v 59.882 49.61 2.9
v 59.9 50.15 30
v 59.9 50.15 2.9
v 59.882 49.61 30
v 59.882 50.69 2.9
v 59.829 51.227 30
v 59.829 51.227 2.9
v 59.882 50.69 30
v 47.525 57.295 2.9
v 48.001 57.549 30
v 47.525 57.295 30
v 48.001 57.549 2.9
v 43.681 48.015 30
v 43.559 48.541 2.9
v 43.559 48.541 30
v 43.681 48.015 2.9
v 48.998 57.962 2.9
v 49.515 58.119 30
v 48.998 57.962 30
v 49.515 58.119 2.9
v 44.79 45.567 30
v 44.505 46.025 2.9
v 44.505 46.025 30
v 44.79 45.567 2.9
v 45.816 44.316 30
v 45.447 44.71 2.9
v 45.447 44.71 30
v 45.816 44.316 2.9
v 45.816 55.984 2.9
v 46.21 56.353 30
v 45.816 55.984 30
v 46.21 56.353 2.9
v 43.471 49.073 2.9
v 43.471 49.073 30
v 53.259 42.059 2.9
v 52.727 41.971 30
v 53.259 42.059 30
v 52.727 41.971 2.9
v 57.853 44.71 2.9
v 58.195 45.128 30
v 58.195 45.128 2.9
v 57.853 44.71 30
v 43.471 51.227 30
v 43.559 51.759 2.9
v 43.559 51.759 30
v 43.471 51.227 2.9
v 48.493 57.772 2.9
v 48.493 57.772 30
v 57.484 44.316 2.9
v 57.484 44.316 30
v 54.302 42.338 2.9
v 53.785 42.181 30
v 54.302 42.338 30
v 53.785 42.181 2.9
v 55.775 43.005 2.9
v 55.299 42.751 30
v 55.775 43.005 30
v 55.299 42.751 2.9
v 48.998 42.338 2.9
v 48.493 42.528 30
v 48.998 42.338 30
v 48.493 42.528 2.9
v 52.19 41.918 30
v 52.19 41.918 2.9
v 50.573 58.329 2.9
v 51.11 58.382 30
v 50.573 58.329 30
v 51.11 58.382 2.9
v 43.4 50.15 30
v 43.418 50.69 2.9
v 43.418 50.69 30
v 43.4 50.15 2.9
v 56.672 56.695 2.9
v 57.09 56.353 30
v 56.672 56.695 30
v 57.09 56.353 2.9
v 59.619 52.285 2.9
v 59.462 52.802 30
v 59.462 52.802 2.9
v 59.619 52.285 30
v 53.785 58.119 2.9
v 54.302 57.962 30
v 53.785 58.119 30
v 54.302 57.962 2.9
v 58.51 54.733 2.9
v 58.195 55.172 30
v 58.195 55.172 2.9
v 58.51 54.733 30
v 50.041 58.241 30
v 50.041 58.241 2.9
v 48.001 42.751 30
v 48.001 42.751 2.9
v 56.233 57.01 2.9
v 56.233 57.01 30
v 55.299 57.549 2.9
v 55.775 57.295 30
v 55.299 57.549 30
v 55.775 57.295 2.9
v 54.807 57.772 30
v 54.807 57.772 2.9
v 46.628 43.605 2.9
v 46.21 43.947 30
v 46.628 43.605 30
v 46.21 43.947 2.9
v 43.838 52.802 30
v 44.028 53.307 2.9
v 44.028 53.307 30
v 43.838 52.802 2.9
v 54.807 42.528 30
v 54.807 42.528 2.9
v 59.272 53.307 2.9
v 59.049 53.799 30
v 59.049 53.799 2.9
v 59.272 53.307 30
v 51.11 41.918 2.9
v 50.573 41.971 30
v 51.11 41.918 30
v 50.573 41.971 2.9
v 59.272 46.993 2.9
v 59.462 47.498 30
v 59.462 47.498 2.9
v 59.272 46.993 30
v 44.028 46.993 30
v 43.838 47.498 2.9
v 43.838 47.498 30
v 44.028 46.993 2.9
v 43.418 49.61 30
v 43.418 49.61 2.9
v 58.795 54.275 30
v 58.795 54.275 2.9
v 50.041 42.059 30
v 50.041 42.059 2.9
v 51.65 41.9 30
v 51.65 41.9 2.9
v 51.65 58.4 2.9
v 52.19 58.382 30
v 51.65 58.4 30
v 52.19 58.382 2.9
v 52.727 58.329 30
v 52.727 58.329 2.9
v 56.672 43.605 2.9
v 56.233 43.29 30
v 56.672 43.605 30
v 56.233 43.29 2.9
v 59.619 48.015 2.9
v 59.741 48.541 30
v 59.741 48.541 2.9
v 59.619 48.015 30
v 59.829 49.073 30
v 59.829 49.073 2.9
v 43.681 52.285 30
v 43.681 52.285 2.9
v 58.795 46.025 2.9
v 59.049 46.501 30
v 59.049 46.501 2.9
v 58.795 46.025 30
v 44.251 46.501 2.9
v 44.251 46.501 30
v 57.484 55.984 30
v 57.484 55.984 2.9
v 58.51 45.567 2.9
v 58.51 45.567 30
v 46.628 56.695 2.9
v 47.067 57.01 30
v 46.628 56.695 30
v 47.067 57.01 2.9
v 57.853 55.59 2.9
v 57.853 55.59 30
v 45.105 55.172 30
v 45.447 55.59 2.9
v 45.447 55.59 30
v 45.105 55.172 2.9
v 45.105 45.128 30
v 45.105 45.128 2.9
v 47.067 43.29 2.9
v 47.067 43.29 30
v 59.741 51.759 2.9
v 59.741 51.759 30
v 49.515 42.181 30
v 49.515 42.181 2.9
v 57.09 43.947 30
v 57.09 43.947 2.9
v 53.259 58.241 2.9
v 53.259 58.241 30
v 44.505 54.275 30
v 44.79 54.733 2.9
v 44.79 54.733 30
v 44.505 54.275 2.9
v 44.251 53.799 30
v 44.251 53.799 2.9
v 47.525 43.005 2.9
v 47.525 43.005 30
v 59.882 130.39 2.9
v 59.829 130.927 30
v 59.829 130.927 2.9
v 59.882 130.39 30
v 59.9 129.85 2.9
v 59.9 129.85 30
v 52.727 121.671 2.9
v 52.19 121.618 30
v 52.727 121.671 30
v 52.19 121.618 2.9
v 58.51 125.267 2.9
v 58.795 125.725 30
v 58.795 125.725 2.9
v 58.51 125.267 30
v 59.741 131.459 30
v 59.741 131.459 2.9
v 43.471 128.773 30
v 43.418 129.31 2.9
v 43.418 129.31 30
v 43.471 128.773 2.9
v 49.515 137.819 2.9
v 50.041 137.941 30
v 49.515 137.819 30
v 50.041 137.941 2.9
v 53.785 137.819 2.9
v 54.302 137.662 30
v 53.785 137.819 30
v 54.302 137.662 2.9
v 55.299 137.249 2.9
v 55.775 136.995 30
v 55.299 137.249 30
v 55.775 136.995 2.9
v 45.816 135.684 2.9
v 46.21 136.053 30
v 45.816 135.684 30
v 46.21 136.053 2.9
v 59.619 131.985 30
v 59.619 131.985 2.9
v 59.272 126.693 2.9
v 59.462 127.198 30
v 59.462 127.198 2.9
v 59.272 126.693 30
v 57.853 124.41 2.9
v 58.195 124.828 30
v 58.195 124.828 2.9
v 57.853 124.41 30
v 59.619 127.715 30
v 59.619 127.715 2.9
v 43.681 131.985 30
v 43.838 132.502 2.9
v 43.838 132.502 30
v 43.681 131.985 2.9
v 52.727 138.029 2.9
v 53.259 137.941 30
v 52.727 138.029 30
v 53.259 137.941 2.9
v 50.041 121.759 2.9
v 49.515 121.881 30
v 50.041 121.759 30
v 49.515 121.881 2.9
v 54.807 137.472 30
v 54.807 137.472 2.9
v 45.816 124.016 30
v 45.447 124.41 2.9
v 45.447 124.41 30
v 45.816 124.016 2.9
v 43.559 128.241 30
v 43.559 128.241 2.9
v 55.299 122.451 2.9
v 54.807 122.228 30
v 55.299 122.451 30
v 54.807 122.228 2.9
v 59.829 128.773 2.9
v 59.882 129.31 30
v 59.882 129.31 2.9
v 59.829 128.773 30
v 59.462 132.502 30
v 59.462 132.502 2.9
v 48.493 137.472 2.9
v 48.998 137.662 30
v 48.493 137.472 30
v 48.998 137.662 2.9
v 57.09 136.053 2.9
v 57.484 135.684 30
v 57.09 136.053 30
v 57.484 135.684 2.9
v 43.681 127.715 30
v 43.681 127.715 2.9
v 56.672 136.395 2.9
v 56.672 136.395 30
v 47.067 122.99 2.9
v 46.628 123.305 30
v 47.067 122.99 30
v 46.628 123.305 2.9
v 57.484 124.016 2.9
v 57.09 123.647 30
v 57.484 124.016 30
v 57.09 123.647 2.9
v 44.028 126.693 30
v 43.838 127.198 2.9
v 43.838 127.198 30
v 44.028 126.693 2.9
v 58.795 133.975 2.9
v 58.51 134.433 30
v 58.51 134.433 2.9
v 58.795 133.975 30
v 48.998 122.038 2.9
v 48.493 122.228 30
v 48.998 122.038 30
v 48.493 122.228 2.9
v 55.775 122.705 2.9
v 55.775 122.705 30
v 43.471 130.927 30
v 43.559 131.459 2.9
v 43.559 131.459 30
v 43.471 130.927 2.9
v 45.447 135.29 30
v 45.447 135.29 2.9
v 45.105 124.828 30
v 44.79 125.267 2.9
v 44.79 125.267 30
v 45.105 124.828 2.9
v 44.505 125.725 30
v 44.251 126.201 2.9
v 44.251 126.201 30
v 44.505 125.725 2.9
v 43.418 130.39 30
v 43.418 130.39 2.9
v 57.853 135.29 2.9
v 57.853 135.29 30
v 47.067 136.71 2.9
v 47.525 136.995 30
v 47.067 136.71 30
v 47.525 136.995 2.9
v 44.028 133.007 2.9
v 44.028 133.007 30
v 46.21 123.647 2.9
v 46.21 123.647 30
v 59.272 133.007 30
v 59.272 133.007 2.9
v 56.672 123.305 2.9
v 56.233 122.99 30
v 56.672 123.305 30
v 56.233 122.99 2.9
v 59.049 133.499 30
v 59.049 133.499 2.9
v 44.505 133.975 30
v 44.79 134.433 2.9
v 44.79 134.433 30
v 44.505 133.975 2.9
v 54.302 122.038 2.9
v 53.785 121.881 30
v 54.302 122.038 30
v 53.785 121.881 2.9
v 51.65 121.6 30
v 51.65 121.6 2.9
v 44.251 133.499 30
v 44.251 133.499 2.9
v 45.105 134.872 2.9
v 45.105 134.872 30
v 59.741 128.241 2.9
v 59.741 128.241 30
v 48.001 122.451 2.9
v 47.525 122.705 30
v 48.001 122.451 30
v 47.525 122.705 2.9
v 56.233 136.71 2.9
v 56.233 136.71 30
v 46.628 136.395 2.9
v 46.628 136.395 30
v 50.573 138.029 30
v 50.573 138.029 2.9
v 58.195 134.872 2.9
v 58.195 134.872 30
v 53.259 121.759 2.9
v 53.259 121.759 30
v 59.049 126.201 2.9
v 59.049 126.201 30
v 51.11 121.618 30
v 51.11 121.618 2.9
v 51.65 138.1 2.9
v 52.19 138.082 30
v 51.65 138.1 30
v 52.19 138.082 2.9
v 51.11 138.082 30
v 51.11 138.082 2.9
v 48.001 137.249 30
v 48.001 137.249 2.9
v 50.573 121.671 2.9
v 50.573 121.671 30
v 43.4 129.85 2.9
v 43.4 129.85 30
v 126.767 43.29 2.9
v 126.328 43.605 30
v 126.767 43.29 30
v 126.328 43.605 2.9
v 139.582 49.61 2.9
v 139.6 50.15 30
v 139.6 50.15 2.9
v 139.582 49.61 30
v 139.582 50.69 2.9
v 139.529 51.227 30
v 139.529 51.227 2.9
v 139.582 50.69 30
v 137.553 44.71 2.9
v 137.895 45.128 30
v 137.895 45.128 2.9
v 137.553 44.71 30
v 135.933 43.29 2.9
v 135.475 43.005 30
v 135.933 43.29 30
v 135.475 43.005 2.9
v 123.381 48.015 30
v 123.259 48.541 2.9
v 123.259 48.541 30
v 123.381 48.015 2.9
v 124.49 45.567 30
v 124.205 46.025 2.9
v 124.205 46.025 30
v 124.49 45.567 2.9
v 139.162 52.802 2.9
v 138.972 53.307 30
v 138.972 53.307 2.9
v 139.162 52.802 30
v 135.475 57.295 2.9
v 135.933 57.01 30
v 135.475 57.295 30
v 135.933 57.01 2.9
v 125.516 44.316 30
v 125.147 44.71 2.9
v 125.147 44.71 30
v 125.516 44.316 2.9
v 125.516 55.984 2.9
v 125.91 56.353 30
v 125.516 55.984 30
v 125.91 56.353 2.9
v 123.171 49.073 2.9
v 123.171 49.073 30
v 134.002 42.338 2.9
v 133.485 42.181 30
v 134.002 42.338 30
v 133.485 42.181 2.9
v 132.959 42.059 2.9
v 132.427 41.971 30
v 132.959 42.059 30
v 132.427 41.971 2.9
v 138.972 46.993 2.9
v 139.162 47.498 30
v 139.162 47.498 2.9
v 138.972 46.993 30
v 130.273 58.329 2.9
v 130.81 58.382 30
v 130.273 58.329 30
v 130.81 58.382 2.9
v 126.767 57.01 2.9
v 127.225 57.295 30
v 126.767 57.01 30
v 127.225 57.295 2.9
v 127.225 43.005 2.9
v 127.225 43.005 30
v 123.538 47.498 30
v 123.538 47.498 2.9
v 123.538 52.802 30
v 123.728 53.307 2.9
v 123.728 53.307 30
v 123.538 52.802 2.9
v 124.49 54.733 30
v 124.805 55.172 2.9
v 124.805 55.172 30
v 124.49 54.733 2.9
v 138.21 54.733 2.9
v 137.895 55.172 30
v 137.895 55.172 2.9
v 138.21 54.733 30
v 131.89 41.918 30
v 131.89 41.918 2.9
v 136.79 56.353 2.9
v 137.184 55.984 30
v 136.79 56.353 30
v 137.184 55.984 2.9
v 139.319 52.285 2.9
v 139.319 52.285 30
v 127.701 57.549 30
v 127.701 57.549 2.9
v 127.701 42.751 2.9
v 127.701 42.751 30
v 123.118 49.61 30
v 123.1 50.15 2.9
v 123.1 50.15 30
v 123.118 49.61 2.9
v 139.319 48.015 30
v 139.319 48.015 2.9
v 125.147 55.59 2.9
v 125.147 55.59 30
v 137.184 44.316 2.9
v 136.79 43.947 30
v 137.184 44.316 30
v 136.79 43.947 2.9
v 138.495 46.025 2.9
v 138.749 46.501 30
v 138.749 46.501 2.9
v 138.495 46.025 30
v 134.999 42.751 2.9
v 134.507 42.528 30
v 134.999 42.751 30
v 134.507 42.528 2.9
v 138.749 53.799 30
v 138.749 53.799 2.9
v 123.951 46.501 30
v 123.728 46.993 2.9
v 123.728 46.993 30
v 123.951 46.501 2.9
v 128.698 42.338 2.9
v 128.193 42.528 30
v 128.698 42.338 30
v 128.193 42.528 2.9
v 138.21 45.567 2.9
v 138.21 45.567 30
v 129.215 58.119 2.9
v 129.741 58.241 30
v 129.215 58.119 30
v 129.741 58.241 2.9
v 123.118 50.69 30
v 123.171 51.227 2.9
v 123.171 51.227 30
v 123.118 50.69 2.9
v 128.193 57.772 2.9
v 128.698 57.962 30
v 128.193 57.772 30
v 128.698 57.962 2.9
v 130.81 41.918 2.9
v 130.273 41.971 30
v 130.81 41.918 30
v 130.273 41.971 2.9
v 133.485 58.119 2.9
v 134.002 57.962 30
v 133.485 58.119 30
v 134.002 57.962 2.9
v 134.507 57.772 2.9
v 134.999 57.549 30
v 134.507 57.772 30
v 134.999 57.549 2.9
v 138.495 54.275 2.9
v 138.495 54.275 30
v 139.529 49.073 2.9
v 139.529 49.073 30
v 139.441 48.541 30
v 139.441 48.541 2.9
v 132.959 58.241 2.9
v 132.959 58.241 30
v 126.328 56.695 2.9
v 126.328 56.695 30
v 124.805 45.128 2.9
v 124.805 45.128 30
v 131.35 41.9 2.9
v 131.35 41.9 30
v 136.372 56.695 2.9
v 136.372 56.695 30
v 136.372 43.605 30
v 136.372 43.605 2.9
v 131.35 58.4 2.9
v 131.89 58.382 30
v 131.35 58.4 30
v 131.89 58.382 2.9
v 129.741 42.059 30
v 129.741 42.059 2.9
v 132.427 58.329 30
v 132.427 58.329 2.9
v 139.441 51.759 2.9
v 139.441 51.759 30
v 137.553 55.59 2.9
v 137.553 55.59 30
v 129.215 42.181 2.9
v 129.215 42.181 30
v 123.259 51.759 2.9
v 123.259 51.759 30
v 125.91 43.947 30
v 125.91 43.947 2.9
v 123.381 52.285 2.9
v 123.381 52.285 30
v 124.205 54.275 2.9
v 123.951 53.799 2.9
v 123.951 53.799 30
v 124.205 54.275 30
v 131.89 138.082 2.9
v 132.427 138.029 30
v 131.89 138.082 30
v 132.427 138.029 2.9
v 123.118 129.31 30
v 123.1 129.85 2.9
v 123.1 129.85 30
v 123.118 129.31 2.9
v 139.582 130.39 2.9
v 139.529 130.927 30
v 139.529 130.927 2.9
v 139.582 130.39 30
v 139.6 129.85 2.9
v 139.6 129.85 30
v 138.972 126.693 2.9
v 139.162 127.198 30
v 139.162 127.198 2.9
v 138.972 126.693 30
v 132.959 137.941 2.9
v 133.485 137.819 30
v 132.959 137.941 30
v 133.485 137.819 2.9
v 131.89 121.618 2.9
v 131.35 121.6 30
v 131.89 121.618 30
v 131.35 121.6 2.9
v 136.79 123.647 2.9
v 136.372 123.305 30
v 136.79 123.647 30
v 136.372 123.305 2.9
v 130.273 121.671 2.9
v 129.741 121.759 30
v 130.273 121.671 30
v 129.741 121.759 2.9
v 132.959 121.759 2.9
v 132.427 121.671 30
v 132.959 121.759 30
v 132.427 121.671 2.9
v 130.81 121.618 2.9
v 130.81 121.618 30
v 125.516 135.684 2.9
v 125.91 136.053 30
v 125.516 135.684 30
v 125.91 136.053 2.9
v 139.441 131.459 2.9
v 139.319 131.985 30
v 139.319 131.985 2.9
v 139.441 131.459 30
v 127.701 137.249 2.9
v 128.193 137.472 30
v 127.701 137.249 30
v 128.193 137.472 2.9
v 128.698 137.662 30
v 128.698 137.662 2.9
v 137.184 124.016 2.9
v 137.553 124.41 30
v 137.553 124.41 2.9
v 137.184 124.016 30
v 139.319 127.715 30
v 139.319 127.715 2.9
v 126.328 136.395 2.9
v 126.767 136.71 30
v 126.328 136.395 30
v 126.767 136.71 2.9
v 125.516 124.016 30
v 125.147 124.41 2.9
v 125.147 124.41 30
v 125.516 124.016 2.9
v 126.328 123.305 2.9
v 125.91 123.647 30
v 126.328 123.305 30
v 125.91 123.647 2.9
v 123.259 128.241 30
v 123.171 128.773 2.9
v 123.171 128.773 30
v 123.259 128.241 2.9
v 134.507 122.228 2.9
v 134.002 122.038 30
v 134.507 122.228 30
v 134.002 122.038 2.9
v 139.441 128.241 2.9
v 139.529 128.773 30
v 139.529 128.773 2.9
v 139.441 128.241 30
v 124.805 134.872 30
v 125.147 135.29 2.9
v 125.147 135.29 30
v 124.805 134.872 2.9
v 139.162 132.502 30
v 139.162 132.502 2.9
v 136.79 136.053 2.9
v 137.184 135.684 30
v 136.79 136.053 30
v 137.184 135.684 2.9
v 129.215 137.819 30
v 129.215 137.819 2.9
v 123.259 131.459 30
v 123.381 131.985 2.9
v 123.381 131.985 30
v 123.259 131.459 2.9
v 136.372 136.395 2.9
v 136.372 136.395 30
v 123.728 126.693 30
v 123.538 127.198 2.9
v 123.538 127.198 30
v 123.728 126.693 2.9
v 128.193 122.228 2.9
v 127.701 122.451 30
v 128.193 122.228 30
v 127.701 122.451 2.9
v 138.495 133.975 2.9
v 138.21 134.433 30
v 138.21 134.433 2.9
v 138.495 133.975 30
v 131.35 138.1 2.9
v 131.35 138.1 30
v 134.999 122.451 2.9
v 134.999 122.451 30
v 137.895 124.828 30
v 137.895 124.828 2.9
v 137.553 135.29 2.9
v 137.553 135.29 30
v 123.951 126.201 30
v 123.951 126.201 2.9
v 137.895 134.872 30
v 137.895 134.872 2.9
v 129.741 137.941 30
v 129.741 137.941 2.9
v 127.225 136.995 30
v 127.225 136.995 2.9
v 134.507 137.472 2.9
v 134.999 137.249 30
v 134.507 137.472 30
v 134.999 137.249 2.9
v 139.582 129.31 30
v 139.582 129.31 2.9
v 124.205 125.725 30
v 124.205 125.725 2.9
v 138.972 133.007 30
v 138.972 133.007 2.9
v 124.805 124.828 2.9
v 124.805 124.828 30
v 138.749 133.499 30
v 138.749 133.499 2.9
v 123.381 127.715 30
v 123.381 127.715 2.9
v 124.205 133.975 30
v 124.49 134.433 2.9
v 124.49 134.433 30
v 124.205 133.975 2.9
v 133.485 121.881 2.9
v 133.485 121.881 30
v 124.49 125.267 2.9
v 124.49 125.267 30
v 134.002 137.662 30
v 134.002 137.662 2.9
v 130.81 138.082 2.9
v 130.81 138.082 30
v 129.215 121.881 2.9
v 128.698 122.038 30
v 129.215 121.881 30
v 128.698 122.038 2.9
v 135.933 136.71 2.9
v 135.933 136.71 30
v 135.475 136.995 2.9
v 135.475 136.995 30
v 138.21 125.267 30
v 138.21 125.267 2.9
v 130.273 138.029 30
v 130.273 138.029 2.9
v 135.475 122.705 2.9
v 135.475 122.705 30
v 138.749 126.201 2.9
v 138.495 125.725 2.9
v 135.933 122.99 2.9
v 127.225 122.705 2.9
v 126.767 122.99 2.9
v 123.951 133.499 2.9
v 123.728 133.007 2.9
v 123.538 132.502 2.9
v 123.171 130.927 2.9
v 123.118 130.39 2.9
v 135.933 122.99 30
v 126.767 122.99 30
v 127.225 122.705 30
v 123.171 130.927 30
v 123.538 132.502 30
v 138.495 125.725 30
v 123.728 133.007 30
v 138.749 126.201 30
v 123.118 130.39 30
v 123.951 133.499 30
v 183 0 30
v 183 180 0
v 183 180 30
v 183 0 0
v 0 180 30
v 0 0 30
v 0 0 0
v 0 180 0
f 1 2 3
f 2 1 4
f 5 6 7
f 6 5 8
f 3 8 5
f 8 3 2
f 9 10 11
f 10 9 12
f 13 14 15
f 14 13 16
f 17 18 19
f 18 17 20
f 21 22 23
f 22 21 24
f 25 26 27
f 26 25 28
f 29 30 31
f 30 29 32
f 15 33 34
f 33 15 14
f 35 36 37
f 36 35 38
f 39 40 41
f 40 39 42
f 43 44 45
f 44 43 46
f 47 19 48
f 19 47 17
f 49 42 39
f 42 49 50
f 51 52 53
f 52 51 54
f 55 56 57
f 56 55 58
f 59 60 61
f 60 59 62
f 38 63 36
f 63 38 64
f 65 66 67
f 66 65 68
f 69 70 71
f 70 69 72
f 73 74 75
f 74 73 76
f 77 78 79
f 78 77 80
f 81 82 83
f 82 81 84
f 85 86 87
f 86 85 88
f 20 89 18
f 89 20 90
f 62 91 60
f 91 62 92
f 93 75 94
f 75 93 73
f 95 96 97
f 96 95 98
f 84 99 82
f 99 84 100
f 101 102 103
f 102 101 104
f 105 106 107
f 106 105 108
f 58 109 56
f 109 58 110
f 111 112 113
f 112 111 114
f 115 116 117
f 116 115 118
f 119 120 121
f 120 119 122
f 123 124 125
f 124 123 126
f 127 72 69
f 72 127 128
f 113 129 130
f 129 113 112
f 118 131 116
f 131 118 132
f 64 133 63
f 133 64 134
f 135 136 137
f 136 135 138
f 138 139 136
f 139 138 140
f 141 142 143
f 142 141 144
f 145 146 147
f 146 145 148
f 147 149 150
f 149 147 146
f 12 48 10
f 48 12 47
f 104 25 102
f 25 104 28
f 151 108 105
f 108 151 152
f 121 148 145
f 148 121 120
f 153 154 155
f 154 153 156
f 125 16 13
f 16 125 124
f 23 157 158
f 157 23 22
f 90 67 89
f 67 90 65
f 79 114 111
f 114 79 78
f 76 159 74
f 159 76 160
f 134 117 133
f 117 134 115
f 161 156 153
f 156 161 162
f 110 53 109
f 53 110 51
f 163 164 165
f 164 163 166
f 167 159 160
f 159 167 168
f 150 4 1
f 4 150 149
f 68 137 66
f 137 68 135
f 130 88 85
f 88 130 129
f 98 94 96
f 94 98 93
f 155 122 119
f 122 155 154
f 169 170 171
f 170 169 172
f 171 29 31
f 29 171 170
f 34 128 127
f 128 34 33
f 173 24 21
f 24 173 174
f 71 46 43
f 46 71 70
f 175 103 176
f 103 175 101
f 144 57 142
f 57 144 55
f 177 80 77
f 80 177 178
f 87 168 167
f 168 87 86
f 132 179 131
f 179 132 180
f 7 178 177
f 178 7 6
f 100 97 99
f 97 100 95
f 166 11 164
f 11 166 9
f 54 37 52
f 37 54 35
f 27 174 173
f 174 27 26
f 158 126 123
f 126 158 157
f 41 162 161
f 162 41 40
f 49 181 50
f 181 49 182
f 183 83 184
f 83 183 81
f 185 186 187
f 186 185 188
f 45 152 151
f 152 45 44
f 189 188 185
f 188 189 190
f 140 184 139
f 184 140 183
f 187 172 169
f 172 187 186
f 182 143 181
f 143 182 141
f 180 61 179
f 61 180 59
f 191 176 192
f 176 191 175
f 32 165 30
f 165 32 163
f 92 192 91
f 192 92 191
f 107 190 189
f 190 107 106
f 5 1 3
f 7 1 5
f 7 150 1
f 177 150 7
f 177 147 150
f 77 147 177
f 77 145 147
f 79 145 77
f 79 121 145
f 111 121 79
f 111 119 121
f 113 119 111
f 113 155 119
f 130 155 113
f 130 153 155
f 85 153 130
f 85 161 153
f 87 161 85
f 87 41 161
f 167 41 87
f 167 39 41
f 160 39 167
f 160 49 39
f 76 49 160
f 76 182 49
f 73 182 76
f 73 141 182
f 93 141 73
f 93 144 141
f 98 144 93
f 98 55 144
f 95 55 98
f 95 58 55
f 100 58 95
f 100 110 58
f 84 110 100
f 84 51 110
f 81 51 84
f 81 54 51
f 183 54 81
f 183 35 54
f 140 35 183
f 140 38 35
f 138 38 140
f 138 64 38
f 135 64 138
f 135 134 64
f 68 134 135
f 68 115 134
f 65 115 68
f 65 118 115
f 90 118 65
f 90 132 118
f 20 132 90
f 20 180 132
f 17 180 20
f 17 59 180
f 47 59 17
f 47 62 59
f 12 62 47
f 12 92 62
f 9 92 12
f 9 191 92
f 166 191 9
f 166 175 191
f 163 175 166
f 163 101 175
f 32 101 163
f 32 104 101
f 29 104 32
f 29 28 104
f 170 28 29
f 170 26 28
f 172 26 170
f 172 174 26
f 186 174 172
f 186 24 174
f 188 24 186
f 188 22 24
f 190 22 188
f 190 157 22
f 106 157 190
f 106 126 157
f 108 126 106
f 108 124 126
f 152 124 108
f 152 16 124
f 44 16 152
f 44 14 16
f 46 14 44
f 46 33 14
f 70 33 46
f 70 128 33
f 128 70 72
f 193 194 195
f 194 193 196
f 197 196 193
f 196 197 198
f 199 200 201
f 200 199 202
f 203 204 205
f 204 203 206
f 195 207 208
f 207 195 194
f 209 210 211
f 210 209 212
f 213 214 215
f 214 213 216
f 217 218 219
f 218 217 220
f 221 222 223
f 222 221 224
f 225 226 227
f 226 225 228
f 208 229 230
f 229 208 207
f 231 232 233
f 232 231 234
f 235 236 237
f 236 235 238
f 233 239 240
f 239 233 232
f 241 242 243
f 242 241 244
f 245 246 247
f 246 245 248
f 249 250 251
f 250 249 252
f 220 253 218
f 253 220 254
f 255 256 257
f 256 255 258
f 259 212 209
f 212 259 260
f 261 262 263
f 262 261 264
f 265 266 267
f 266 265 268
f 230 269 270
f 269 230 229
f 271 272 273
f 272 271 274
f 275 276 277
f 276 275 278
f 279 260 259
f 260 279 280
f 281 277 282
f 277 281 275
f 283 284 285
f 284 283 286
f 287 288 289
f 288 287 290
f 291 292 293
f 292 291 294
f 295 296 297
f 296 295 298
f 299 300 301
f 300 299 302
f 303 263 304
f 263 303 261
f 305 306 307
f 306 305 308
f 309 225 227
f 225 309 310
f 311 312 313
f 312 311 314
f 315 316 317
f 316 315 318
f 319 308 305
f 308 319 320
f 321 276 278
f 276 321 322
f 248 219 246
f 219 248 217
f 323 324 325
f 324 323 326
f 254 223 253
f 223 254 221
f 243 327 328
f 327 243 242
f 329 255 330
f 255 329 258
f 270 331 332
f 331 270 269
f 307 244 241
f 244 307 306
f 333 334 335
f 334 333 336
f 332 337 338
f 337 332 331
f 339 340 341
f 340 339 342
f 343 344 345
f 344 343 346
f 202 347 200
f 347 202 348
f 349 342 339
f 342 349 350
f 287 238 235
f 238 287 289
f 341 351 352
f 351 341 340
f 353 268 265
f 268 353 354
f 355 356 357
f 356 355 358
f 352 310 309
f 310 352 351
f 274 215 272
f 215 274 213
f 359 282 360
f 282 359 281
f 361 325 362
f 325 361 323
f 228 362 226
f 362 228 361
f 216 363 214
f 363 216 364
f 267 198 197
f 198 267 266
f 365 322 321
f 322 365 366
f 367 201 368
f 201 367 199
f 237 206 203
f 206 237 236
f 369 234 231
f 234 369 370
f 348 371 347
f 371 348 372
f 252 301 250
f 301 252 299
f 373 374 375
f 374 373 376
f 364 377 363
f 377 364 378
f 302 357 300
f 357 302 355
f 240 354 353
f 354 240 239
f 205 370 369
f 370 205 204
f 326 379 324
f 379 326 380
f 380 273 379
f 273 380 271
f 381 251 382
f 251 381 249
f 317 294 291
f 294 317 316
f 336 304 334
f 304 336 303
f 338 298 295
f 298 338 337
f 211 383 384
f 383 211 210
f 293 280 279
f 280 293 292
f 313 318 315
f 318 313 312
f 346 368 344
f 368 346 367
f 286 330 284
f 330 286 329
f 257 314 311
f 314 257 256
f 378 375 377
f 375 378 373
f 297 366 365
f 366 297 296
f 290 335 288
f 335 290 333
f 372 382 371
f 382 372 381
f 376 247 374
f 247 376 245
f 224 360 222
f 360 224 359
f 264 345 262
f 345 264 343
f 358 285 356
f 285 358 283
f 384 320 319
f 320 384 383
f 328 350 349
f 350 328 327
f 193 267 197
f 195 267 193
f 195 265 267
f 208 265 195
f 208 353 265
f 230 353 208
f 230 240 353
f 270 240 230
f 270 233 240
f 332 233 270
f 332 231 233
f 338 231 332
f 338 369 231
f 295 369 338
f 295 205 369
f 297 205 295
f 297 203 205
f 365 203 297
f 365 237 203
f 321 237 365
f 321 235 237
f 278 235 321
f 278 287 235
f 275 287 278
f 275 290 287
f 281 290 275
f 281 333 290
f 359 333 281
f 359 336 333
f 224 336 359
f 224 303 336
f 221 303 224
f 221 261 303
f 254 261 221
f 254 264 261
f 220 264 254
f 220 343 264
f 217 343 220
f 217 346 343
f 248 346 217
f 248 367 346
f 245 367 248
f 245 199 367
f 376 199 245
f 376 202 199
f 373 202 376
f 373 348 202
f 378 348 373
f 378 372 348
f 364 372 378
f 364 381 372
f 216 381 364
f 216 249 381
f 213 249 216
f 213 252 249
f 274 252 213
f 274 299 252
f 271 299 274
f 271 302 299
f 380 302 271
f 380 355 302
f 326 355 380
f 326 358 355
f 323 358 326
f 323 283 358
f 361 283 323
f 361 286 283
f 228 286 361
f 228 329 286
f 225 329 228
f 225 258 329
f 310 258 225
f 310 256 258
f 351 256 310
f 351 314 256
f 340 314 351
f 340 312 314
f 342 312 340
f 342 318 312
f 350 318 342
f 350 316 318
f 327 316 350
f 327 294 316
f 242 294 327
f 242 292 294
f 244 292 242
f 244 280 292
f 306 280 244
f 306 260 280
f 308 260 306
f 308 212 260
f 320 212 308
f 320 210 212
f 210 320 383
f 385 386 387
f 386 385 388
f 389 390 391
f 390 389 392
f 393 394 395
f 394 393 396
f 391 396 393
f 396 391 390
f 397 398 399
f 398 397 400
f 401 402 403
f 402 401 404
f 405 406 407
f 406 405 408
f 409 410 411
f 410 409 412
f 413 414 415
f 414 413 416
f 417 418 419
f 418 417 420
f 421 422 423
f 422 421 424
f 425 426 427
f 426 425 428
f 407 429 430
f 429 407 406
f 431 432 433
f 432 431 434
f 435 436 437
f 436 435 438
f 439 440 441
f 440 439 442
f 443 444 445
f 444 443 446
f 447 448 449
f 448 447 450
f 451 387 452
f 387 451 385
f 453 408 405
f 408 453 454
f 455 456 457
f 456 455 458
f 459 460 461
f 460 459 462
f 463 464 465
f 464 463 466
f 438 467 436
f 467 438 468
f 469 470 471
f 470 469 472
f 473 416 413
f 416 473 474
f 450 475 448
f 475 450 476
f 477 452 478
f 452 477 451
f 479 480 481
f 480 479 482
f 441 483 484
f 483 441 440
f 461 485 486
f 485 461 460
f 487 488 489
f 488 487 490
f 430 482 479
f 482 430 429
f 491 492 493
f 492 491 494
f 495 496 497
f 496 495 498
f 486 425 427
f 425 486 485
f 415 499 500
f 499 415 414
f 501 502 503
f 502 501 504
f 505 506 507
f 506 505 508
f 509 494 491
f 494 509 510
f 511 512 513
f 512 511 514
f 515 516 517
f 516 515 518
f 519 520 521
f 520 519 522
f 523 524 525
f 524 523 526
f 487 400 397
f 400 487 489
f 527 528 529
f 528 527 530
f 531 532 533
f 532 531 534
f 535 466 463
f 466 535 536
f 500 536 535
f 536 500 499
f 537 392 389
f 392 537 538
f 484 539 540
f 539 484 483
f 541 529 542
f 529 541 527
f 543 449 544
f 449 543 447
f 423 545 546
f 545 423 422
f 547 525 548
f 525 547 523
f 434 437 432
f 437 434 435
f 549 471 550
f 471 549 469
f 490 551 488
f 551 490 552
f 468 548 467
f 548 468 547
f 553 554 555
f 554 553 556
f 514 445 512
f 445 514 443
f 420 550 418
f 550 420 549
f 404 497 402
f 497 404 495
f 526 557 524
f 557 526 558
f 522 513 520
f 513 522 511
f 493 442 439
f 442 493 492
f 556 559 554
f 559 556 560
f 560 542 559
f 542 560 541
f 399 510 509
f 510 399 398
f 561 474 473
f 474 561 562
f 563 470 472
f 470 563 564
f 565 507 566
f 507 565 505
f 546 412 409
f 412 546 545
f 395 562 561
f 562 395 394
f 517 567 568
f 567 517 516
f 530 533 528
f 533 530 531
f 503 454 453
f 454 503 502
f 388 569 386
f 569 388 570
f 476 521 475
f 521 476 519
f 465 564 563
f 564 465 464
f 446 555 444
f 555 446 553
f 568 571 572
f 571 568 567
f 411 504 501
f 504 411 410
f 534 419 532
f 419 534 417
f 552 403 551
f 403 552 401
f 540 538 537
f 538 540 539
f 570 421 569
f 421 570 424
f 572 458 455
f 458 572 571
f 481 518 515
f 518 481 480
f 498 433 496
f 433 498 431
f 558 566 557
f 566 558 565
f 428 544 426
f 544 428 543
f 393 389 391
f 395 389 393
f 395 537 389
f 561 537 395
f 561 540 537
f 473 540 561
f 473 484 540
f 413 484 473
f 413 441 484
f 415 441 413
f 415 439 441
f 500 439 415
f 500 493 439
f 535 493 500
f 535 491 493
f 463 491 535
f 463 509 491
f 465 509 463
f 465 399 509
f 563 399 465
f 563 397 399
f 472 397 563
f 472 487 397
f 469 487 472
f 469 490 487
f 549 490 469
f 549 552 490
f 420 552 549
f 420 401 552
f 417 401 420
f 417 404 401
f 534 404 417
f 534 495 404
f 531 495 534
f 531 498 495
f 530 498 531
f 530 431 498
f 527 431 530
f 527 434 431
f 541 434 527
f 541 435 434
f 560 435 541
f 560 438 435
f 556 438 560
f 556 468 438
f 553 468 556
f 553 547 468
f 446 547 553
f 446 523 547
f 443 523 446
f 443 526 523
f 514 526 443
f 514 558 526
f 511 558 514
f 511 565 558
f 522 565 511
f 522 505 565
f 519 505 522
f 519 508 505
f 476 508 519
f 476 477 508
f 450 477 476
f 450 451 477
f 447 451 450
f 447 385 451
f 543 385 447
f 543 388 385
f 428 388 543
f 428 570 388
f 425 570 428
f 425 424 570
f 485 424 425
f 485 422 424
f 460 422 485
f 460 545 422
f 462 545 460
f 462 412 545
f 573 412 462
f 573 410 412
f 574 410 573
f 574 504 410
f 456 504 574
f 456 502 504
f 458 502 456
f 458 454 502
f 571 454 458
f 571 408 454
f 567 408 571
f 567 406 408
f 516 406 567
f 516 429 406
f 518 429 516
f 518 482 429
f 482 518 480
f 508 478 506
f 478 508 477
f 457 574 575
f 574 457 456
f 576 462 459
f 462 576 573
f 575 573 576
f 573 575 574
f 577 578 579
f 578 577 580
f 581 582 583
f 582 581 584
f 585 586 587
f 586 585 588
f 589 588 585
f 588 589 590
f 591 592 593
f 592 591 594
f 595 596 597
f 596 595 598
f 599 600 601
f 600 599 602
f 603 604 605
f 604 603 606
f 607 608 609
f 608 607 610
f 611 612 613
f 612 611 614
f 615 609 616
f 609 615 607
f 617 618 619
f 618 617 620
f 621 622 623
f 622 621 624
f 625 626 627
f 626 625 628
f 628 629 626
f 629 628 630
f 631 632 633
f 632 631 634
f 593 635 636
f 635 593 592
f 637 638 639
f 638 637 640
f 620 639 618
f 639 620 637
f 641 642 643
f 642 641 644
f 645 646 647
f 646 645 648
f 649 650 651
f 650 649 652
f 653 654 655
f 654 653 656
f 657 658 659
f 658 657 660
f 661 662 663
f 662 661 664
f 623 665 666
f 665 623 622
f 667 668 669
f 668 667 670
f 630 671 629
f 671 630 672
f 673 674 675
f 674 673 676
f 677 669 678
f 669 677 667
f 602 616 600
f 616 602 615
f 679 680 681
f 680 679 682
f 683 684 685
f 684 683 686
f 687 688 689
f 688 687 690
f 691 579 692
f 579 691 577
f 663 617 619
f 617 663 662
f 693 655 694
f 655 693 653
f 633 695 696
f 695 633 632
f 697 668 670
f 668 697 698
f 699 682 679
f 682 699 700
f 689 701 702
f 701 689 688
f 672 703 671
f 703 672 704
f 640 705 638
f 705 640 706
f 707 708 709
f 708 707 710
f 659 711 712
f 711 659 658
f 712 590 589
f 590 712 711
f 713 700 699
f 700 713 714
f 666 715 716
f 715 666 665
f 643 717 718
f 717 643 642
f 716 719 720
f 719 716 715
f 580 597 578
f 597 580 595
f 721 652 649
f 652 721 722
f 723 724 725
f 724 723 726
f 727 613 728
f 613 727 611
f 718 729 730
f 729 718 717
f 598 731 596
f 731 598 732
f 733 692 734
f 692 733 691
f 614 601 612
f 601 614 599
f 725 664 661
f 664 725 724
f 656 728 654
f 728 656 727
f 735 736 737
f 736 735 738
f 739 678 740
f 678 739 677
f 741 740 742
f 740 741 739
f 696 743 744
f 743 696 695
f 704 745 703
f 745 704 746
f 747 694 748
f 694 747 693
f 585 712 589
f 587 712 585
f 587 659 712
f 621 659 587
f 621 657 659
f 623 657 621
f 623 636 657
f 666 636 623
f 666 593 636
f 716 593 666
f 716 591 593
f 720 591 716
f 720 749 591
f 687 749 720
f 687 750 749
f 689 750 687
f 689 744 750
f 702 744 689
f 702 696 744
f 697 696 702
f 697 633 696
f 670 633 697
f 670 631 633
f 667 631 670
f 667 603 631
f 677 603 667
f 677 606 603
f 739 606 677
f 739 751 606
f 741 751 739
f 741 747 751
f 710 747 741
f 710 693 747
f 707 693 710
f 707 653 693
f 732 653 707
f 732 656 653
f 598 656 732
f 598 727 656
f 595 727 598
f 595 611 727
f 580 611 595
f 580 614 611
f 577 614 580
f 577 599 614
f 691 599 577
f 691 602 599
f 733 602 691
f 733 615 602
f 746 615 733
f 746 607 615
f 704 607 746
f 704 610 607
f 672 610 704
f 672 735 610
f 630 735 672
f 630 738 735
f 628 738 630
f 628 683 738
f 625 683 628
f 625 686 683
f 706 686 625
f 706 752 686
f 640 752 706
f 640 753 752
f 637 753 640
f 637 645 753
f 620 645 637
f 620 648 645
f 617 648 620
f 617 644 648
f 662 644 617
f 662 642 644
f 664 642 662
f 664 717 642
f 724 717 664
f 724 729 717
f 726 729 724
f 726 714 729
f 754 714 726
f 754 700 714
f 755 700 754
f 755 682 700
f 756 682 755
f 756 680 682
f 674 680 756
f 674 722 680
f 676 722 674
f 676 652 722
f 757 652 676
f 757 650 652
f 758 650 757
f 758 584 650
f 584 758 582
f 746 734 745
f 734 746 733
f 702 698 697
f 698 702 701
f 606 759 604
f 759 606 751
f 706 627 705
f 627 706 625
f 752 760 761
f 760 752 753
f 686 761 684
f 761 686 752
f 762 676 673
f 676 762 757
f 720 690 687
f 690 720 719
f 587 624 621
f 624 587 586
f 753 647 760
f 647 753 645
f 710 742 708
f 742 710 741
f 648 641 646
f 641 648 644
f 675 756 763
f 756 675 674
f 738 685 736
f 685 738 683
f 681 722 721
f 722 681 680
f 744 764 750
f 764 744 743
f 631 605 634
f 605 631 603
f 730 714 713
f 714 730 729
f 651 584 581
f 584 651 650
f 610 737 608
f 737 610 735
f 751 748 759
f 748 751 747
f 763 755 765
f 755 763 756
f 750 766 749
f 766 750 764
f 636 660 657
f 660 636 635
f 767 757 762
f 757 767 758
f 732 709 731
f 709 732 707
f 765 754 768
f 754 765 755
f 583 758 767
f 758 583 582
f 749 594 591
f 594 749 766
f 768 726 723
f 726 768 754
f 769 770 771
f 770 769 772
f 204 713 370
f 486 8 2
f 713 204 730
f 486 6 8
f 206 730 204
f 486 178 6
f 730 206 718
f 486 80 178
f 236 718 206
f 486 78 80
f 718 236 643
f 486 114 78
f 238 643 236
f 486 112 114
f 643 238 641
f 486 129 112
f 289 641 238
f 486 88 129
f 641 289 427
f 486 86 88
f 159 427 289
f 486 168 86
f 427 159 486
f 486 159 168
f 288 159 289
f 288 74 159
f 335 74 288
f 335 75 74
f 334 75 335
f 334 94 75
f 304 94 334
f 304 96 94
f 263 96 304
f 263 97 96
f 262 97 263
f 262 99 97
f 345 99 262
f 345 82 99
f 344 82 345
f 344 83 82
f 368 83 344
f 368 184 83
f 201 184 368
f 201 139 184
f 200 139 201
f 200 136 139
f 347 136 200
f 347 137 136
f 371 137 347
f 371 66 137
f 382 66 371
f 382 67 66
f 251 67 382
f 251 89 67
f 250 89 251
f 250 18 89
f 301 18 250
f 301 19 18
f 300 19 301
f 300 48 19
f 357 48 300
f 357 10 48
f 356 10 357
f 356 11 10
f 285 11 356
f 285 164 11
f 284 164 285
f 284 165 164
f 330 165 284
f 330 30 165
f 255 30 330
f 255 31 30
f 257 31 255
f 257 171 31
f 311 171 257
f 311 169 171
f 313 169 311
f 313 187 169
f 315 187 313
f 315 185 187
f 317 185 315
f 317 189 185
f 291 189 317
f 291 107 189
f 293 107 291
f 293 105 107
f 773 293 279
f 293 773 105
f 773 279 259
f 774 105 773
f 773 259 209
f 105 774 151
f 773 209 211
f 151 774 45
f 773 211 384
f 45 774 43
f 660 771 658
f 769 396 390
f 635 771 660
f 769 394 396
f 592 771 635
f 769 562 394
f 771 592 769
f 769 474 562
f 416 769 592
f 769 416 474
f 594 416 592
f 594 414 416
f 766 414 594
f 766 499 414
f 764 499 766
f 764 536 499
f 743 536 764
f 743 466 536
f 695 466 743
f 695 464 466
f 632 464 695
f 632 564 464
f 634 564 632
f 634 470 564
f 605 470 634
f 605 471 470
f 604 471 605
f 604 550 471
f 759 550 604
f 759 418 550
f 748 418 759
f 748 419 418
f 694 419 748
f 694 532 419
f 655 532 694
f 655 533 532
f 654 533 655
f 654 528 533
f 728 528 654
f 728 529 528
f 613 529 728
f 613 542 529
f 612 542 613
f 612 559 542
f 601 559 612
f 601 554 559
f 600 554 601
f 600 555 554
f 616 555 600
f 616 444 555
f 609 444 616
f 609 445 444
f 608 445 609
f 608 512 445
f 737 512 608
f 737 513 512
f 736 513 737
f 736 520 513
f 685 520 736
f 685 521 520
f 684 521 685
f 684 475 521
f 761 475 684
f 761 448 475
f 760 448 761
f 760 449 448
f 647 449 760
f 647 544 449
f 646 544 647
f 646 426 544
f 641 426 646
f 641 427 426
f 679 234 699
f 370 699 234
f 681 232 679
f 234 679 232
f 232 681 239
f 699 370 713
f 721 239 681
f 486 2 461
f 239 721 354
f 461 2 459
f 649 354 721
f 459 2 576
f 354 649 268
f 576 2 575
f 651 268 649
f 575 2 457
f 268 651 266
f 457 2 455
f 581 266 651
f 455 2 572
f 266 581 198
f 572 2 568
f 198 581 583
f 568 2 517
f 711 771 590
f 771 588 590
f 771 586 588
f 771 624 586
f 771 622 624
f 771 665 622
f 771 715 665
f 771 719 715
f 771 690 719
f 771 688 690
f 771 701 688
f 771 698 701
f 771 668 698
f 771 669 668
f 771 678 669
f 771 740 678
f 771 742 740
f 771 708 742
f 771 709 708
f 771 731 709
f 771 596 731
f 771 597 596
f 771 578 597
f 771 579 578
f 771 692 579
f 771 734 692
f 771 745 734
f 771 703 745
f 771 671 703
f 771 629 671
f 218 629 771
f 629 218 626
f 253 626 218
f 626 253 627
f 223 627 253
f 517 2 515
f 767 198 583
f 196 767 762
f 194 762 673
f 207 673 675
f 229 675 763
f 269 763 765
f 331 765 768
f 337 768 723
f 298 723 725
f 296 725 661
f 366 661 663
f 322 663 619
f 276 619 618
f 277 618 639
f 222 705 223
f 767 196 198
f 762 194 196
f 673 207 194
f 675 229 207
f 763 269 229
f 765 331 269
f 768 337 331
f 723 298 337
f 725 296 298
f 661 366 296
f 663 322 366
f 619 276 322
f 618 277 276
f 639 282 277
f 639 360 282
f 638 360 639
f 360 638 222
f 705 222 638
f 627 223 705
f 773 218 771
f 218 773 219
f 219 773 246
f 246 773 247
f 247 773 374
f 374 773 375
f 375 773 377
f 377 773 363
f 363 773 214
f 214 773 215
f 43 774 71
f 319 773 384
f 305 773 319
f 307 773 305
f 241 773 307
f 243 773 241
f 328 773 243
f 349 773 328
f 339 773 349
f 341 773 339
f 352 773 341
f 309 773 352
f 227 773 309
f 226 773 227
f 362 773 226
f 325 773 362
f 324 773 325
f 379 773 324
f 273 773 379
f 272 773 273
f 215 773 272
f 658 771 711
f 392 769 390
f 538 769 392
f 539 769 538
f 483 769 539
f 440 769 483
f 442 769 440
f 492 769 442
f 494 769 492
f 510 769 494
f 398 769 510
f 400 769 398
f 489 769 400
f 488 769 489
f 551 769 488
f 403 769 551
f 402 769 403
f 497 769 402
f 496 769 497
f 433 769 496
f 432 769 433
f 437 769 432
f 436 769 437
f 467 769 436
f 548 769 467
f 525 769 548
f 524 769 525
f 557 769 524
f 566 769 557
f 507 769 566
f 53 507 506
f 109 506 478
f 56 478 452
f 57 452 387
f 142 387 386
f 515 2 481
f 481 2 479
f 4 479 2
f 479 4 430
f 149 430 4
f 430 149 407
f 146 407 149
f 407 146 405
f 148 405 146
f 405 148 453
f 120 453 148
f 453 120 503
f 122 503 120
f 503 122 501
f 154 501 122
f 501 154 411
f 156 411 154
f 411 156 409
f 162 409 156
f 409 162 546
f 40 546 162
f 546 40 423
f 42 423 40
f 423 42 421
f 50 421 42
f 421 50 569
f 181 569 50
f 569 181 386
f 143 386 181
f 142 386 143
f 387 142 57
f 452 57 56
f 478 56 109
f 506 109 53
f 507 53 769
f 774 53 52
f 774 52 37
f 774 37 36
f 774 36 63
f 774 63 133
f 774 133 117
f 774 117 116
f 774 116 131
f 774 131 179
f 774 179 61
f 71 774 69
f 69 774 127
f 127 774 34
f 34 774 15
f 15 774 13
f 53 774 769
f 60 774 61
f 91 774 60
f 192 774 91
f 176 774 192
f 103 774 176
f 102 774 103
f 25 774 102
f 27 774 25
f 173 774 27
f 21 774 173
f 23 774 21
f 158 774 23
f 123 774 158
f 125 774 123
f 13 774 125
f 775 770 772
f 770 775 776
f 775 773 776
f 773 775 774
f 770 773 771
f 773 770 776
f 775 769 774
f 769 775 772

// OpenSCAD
// file: sticker_insert.scad
// sticker_insert.scad — parametric sticker-holder insert
//
// A rectangular tray with a centered grid of circular pockets that hold
// sticker rolls / discs. Use this module from the variant files
// (insert_2x2_stickers_3x3.scad, insert_3x3_stickers_2x2.scad).
//
// NOTE: This is a reconstruction. The original CAD source for the inserts
// was not preserved, so these parameters were recovered by measuring the
// original STL meshes (see the project research notes). Reproduces the same
// design, reoriented Z-up (the originals were modeled with height on Y).

// ---- Default shell dimensions (mm) ----
OUTER_W   = 183;   // X — footprint width
OUTER_D   = 180;   // Y — footprint depth
HEIGHT    = 30;    // Z — overall height
FLOOR_T   = 2.9;   // solid base beneath the pockets
POCKET_DIA = 16.5; // pocket diameter

// Smoothness of the pocket cylinders.
$fn = 96;

// sticker_insert(cols, rows, spacing_x, spacing_y, ...)
//   cols, rows   — pocket grid counts in X and Y
//   spacing_x/y  — center-to-center pocket spacing (grid is auto-centered)
module sticker_insert(cols, rows, spacing_x, spacing_y,
                      outer_w = OUTER_W, outer_d = OUTER_D,
                      height = HEIGHT, floor_t = FLOOR_T,
                      pocket_dia = POCKET_DIA) {
    pocket_depth = height - floor_t;
    difference() {
        cube([outer_w, outer_d, height]);
        for (i = [0 : cols - 1], j = [0 : rows - 1]) {
            cx = outer_w / 2 + (i - (cols - 1) / 2) * spacing_x;
            cy = outer_d / 2 + (j - (rows - 1) / 2) * spacing_y;
            // start at the floor, overshoot the top so the pocket opens cleanly
            translate([cx, cy, floor_t])
                cylinder(h = pocket_depth + 1, d = pocket_dia);
        }
    }
}
// main file
// insert_3x3_stickers_2x2 — 2×2 grid of pockets (for 3×3-size stickers).
// Render: openscad -o insert_3x3_stickers_2x2.stl insert_3x3_stickers_2x2.scad
use <sticker_insert.scad>

sticker_insert(cols = 2, rows = 2, spacing_x = 79.7, spacing_y = 79.7);
